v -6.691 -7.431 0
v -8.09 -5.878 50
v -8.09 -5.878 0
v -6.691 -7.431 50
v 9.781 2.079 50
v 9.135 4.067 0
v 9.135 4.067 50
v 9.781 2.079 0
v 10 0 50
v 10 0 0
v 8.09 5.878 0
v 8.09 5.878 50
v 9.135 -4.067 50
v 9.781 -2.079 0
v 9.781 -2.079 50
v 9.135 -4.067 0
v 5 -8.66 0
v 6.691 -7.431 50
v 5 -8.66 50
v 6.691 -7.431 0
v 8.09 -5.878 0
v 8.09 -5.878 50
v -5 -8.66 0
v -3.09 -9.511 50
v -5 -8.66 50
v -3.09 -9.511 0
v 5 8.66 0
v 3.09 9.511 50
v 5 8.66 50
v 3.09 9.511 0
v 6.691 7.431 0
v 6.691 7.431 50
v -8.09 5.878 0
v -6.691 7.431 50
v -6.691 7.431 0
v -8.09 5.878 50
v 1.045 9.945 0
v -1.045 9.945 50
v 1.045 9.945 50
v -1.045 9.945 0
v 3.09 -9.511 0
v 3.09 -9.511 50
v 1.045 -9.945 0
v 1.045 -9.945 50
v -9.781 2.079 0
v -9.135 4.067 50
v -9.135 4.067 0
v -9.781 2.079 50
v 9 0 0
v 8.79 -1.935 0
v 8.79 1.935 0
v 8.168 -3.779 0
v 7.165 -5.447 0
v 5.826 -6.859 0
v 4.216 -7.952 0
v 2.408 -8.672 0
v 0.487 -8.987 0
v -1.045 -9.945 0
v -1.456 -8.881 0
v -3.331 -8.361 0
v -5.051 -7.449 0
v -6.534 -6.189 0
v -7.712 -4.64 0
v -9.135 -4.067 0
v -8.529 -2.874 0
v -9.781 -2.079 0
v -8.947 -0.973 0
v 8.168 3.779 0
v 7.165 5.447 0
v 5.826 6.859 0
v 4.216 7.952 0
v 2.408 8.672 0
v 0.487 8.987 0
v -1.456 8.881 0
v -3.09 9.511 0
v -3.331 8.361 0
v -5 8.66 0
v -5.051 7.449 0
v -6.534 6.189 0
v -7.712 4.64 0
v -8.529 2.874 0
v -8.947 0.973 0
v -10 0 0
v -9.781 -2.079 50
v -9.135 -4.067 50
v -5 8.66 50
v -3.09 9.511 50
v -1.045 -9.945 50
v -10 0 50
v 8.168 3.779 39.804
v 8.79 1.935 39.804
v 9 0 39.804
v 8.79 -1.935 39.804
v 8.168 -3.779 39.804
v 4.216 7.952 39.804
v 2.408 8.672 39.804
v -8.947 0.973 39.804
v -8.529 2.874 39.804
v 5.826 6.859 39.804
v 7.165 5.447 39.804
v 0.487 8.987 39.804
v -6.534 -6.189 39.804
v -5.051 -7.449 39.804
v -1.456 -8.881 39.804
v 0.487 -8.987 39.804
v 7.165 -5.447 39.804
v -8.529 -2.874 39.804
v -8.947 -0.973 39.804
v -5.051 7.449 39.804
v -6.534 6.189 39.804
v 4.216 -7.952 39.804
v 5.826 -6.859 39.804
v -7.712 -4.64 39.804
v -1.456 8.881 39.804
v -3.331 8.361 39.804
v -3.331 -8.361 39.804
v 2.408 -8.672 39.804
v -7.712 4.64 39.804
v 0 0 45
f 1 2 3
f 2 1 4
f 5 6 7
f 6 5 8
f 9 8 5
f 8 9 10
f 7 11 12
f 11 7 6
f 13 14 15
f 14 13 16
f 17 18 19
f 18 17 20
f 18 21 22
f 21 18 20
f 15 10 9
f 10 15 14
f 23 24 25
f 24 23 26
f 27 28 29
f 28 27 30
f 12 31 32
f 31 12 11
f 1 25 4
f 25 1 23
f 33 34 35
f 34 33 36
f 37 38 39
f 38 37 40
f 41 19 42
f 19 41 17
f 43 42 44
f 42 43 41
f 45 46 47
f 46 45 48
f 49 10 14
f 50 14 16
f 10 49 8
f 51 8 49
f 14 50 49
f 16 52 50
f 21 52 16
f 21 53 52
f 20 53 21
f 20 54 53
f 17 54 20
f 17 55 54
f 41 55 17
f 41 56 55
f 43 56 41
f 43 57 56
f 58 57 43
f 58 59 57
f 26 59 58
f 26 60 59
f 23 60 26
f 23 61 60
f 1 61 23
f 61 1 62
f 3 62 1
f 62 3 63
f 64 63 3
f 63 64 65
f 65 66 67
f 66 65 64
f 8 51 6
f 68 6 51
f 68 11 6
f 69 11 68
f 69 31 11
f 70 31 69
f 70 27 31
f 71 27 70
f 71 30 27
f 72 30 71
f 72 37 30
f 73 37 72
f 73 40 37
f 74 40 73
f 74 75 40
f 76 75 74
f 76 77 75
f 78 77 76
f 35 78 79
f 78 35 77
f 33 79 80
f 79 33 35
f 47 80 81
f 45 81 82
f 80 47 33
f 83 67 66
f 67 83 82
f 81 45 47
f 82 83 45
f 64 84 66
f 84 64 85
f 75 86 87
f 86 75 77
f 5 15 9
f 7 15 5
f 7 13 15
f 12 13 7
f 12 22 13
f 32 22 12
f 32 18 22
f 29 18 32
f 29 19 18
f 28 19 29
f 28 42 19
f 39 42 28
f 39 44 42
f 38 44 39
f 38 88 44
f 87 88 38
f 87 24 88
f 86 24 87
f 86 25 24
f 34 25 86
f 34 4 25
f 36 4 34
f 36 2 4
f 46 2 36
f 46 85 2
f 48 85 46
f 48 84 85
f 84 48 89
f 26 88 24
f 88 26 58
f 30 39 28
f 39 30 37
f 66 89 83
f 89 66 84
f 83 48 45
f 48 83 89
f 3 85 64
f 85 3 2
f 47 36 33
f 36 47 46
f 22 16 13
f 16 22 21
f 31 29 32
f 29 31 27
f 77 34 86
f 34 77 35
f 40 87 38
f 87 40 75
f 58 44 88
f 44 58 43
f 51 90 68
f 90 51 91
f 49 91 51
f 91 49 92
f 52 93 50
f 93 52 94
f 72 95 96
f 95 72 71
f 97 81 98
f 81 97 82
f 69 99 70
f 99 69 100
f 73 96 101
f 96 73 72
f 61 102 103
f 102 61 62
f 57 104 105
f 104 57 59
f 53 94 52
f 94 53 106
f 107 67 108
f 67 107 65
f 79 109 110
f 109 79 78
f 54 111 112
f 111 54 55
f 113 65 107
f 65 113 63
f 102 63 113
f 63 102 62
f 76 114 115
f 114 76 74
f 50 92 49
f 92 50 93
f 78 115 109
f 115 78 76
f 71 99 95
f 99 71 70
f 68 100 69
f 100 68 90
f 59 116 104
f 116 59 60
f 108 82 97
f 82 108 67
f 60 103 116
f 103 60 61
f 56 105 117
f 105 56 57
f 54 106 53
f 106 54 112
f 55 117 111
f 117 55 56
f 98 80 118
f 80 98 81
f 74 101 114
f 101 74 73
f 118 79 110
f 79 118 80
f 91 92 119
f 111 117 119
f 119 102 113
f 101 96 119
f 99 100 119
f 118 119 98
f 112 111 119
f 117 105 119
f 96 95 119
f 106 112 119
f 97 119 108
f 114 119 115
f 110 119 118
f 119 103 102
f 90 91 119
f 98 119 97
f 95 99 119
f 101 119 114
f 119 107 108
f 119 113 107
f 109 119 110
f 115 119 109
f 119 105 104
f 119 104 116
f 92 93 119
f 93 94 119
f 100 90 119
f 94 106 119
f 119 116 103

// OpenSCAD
// Компенсатор утечек PLA пластика
// в виде цилиндра высотой модели

h=50; //высота цилиндра
h0=45; //начало проблем с протеканием по высоте
R1=10; // диаметр цилиндра
R0=9; // внутренний диаметр в непроблеммной части

fi=30; // угол перехода от полого цилиндра к заполненному

dh=R0*tan(fi);

h1=h0-dh;

difference(){
	cylinder(h,r=R1);
	cylinder(h1,r=R0);
	translate([0,0,h1]) cylinder (dh,r1=R0,r2=0);
}
